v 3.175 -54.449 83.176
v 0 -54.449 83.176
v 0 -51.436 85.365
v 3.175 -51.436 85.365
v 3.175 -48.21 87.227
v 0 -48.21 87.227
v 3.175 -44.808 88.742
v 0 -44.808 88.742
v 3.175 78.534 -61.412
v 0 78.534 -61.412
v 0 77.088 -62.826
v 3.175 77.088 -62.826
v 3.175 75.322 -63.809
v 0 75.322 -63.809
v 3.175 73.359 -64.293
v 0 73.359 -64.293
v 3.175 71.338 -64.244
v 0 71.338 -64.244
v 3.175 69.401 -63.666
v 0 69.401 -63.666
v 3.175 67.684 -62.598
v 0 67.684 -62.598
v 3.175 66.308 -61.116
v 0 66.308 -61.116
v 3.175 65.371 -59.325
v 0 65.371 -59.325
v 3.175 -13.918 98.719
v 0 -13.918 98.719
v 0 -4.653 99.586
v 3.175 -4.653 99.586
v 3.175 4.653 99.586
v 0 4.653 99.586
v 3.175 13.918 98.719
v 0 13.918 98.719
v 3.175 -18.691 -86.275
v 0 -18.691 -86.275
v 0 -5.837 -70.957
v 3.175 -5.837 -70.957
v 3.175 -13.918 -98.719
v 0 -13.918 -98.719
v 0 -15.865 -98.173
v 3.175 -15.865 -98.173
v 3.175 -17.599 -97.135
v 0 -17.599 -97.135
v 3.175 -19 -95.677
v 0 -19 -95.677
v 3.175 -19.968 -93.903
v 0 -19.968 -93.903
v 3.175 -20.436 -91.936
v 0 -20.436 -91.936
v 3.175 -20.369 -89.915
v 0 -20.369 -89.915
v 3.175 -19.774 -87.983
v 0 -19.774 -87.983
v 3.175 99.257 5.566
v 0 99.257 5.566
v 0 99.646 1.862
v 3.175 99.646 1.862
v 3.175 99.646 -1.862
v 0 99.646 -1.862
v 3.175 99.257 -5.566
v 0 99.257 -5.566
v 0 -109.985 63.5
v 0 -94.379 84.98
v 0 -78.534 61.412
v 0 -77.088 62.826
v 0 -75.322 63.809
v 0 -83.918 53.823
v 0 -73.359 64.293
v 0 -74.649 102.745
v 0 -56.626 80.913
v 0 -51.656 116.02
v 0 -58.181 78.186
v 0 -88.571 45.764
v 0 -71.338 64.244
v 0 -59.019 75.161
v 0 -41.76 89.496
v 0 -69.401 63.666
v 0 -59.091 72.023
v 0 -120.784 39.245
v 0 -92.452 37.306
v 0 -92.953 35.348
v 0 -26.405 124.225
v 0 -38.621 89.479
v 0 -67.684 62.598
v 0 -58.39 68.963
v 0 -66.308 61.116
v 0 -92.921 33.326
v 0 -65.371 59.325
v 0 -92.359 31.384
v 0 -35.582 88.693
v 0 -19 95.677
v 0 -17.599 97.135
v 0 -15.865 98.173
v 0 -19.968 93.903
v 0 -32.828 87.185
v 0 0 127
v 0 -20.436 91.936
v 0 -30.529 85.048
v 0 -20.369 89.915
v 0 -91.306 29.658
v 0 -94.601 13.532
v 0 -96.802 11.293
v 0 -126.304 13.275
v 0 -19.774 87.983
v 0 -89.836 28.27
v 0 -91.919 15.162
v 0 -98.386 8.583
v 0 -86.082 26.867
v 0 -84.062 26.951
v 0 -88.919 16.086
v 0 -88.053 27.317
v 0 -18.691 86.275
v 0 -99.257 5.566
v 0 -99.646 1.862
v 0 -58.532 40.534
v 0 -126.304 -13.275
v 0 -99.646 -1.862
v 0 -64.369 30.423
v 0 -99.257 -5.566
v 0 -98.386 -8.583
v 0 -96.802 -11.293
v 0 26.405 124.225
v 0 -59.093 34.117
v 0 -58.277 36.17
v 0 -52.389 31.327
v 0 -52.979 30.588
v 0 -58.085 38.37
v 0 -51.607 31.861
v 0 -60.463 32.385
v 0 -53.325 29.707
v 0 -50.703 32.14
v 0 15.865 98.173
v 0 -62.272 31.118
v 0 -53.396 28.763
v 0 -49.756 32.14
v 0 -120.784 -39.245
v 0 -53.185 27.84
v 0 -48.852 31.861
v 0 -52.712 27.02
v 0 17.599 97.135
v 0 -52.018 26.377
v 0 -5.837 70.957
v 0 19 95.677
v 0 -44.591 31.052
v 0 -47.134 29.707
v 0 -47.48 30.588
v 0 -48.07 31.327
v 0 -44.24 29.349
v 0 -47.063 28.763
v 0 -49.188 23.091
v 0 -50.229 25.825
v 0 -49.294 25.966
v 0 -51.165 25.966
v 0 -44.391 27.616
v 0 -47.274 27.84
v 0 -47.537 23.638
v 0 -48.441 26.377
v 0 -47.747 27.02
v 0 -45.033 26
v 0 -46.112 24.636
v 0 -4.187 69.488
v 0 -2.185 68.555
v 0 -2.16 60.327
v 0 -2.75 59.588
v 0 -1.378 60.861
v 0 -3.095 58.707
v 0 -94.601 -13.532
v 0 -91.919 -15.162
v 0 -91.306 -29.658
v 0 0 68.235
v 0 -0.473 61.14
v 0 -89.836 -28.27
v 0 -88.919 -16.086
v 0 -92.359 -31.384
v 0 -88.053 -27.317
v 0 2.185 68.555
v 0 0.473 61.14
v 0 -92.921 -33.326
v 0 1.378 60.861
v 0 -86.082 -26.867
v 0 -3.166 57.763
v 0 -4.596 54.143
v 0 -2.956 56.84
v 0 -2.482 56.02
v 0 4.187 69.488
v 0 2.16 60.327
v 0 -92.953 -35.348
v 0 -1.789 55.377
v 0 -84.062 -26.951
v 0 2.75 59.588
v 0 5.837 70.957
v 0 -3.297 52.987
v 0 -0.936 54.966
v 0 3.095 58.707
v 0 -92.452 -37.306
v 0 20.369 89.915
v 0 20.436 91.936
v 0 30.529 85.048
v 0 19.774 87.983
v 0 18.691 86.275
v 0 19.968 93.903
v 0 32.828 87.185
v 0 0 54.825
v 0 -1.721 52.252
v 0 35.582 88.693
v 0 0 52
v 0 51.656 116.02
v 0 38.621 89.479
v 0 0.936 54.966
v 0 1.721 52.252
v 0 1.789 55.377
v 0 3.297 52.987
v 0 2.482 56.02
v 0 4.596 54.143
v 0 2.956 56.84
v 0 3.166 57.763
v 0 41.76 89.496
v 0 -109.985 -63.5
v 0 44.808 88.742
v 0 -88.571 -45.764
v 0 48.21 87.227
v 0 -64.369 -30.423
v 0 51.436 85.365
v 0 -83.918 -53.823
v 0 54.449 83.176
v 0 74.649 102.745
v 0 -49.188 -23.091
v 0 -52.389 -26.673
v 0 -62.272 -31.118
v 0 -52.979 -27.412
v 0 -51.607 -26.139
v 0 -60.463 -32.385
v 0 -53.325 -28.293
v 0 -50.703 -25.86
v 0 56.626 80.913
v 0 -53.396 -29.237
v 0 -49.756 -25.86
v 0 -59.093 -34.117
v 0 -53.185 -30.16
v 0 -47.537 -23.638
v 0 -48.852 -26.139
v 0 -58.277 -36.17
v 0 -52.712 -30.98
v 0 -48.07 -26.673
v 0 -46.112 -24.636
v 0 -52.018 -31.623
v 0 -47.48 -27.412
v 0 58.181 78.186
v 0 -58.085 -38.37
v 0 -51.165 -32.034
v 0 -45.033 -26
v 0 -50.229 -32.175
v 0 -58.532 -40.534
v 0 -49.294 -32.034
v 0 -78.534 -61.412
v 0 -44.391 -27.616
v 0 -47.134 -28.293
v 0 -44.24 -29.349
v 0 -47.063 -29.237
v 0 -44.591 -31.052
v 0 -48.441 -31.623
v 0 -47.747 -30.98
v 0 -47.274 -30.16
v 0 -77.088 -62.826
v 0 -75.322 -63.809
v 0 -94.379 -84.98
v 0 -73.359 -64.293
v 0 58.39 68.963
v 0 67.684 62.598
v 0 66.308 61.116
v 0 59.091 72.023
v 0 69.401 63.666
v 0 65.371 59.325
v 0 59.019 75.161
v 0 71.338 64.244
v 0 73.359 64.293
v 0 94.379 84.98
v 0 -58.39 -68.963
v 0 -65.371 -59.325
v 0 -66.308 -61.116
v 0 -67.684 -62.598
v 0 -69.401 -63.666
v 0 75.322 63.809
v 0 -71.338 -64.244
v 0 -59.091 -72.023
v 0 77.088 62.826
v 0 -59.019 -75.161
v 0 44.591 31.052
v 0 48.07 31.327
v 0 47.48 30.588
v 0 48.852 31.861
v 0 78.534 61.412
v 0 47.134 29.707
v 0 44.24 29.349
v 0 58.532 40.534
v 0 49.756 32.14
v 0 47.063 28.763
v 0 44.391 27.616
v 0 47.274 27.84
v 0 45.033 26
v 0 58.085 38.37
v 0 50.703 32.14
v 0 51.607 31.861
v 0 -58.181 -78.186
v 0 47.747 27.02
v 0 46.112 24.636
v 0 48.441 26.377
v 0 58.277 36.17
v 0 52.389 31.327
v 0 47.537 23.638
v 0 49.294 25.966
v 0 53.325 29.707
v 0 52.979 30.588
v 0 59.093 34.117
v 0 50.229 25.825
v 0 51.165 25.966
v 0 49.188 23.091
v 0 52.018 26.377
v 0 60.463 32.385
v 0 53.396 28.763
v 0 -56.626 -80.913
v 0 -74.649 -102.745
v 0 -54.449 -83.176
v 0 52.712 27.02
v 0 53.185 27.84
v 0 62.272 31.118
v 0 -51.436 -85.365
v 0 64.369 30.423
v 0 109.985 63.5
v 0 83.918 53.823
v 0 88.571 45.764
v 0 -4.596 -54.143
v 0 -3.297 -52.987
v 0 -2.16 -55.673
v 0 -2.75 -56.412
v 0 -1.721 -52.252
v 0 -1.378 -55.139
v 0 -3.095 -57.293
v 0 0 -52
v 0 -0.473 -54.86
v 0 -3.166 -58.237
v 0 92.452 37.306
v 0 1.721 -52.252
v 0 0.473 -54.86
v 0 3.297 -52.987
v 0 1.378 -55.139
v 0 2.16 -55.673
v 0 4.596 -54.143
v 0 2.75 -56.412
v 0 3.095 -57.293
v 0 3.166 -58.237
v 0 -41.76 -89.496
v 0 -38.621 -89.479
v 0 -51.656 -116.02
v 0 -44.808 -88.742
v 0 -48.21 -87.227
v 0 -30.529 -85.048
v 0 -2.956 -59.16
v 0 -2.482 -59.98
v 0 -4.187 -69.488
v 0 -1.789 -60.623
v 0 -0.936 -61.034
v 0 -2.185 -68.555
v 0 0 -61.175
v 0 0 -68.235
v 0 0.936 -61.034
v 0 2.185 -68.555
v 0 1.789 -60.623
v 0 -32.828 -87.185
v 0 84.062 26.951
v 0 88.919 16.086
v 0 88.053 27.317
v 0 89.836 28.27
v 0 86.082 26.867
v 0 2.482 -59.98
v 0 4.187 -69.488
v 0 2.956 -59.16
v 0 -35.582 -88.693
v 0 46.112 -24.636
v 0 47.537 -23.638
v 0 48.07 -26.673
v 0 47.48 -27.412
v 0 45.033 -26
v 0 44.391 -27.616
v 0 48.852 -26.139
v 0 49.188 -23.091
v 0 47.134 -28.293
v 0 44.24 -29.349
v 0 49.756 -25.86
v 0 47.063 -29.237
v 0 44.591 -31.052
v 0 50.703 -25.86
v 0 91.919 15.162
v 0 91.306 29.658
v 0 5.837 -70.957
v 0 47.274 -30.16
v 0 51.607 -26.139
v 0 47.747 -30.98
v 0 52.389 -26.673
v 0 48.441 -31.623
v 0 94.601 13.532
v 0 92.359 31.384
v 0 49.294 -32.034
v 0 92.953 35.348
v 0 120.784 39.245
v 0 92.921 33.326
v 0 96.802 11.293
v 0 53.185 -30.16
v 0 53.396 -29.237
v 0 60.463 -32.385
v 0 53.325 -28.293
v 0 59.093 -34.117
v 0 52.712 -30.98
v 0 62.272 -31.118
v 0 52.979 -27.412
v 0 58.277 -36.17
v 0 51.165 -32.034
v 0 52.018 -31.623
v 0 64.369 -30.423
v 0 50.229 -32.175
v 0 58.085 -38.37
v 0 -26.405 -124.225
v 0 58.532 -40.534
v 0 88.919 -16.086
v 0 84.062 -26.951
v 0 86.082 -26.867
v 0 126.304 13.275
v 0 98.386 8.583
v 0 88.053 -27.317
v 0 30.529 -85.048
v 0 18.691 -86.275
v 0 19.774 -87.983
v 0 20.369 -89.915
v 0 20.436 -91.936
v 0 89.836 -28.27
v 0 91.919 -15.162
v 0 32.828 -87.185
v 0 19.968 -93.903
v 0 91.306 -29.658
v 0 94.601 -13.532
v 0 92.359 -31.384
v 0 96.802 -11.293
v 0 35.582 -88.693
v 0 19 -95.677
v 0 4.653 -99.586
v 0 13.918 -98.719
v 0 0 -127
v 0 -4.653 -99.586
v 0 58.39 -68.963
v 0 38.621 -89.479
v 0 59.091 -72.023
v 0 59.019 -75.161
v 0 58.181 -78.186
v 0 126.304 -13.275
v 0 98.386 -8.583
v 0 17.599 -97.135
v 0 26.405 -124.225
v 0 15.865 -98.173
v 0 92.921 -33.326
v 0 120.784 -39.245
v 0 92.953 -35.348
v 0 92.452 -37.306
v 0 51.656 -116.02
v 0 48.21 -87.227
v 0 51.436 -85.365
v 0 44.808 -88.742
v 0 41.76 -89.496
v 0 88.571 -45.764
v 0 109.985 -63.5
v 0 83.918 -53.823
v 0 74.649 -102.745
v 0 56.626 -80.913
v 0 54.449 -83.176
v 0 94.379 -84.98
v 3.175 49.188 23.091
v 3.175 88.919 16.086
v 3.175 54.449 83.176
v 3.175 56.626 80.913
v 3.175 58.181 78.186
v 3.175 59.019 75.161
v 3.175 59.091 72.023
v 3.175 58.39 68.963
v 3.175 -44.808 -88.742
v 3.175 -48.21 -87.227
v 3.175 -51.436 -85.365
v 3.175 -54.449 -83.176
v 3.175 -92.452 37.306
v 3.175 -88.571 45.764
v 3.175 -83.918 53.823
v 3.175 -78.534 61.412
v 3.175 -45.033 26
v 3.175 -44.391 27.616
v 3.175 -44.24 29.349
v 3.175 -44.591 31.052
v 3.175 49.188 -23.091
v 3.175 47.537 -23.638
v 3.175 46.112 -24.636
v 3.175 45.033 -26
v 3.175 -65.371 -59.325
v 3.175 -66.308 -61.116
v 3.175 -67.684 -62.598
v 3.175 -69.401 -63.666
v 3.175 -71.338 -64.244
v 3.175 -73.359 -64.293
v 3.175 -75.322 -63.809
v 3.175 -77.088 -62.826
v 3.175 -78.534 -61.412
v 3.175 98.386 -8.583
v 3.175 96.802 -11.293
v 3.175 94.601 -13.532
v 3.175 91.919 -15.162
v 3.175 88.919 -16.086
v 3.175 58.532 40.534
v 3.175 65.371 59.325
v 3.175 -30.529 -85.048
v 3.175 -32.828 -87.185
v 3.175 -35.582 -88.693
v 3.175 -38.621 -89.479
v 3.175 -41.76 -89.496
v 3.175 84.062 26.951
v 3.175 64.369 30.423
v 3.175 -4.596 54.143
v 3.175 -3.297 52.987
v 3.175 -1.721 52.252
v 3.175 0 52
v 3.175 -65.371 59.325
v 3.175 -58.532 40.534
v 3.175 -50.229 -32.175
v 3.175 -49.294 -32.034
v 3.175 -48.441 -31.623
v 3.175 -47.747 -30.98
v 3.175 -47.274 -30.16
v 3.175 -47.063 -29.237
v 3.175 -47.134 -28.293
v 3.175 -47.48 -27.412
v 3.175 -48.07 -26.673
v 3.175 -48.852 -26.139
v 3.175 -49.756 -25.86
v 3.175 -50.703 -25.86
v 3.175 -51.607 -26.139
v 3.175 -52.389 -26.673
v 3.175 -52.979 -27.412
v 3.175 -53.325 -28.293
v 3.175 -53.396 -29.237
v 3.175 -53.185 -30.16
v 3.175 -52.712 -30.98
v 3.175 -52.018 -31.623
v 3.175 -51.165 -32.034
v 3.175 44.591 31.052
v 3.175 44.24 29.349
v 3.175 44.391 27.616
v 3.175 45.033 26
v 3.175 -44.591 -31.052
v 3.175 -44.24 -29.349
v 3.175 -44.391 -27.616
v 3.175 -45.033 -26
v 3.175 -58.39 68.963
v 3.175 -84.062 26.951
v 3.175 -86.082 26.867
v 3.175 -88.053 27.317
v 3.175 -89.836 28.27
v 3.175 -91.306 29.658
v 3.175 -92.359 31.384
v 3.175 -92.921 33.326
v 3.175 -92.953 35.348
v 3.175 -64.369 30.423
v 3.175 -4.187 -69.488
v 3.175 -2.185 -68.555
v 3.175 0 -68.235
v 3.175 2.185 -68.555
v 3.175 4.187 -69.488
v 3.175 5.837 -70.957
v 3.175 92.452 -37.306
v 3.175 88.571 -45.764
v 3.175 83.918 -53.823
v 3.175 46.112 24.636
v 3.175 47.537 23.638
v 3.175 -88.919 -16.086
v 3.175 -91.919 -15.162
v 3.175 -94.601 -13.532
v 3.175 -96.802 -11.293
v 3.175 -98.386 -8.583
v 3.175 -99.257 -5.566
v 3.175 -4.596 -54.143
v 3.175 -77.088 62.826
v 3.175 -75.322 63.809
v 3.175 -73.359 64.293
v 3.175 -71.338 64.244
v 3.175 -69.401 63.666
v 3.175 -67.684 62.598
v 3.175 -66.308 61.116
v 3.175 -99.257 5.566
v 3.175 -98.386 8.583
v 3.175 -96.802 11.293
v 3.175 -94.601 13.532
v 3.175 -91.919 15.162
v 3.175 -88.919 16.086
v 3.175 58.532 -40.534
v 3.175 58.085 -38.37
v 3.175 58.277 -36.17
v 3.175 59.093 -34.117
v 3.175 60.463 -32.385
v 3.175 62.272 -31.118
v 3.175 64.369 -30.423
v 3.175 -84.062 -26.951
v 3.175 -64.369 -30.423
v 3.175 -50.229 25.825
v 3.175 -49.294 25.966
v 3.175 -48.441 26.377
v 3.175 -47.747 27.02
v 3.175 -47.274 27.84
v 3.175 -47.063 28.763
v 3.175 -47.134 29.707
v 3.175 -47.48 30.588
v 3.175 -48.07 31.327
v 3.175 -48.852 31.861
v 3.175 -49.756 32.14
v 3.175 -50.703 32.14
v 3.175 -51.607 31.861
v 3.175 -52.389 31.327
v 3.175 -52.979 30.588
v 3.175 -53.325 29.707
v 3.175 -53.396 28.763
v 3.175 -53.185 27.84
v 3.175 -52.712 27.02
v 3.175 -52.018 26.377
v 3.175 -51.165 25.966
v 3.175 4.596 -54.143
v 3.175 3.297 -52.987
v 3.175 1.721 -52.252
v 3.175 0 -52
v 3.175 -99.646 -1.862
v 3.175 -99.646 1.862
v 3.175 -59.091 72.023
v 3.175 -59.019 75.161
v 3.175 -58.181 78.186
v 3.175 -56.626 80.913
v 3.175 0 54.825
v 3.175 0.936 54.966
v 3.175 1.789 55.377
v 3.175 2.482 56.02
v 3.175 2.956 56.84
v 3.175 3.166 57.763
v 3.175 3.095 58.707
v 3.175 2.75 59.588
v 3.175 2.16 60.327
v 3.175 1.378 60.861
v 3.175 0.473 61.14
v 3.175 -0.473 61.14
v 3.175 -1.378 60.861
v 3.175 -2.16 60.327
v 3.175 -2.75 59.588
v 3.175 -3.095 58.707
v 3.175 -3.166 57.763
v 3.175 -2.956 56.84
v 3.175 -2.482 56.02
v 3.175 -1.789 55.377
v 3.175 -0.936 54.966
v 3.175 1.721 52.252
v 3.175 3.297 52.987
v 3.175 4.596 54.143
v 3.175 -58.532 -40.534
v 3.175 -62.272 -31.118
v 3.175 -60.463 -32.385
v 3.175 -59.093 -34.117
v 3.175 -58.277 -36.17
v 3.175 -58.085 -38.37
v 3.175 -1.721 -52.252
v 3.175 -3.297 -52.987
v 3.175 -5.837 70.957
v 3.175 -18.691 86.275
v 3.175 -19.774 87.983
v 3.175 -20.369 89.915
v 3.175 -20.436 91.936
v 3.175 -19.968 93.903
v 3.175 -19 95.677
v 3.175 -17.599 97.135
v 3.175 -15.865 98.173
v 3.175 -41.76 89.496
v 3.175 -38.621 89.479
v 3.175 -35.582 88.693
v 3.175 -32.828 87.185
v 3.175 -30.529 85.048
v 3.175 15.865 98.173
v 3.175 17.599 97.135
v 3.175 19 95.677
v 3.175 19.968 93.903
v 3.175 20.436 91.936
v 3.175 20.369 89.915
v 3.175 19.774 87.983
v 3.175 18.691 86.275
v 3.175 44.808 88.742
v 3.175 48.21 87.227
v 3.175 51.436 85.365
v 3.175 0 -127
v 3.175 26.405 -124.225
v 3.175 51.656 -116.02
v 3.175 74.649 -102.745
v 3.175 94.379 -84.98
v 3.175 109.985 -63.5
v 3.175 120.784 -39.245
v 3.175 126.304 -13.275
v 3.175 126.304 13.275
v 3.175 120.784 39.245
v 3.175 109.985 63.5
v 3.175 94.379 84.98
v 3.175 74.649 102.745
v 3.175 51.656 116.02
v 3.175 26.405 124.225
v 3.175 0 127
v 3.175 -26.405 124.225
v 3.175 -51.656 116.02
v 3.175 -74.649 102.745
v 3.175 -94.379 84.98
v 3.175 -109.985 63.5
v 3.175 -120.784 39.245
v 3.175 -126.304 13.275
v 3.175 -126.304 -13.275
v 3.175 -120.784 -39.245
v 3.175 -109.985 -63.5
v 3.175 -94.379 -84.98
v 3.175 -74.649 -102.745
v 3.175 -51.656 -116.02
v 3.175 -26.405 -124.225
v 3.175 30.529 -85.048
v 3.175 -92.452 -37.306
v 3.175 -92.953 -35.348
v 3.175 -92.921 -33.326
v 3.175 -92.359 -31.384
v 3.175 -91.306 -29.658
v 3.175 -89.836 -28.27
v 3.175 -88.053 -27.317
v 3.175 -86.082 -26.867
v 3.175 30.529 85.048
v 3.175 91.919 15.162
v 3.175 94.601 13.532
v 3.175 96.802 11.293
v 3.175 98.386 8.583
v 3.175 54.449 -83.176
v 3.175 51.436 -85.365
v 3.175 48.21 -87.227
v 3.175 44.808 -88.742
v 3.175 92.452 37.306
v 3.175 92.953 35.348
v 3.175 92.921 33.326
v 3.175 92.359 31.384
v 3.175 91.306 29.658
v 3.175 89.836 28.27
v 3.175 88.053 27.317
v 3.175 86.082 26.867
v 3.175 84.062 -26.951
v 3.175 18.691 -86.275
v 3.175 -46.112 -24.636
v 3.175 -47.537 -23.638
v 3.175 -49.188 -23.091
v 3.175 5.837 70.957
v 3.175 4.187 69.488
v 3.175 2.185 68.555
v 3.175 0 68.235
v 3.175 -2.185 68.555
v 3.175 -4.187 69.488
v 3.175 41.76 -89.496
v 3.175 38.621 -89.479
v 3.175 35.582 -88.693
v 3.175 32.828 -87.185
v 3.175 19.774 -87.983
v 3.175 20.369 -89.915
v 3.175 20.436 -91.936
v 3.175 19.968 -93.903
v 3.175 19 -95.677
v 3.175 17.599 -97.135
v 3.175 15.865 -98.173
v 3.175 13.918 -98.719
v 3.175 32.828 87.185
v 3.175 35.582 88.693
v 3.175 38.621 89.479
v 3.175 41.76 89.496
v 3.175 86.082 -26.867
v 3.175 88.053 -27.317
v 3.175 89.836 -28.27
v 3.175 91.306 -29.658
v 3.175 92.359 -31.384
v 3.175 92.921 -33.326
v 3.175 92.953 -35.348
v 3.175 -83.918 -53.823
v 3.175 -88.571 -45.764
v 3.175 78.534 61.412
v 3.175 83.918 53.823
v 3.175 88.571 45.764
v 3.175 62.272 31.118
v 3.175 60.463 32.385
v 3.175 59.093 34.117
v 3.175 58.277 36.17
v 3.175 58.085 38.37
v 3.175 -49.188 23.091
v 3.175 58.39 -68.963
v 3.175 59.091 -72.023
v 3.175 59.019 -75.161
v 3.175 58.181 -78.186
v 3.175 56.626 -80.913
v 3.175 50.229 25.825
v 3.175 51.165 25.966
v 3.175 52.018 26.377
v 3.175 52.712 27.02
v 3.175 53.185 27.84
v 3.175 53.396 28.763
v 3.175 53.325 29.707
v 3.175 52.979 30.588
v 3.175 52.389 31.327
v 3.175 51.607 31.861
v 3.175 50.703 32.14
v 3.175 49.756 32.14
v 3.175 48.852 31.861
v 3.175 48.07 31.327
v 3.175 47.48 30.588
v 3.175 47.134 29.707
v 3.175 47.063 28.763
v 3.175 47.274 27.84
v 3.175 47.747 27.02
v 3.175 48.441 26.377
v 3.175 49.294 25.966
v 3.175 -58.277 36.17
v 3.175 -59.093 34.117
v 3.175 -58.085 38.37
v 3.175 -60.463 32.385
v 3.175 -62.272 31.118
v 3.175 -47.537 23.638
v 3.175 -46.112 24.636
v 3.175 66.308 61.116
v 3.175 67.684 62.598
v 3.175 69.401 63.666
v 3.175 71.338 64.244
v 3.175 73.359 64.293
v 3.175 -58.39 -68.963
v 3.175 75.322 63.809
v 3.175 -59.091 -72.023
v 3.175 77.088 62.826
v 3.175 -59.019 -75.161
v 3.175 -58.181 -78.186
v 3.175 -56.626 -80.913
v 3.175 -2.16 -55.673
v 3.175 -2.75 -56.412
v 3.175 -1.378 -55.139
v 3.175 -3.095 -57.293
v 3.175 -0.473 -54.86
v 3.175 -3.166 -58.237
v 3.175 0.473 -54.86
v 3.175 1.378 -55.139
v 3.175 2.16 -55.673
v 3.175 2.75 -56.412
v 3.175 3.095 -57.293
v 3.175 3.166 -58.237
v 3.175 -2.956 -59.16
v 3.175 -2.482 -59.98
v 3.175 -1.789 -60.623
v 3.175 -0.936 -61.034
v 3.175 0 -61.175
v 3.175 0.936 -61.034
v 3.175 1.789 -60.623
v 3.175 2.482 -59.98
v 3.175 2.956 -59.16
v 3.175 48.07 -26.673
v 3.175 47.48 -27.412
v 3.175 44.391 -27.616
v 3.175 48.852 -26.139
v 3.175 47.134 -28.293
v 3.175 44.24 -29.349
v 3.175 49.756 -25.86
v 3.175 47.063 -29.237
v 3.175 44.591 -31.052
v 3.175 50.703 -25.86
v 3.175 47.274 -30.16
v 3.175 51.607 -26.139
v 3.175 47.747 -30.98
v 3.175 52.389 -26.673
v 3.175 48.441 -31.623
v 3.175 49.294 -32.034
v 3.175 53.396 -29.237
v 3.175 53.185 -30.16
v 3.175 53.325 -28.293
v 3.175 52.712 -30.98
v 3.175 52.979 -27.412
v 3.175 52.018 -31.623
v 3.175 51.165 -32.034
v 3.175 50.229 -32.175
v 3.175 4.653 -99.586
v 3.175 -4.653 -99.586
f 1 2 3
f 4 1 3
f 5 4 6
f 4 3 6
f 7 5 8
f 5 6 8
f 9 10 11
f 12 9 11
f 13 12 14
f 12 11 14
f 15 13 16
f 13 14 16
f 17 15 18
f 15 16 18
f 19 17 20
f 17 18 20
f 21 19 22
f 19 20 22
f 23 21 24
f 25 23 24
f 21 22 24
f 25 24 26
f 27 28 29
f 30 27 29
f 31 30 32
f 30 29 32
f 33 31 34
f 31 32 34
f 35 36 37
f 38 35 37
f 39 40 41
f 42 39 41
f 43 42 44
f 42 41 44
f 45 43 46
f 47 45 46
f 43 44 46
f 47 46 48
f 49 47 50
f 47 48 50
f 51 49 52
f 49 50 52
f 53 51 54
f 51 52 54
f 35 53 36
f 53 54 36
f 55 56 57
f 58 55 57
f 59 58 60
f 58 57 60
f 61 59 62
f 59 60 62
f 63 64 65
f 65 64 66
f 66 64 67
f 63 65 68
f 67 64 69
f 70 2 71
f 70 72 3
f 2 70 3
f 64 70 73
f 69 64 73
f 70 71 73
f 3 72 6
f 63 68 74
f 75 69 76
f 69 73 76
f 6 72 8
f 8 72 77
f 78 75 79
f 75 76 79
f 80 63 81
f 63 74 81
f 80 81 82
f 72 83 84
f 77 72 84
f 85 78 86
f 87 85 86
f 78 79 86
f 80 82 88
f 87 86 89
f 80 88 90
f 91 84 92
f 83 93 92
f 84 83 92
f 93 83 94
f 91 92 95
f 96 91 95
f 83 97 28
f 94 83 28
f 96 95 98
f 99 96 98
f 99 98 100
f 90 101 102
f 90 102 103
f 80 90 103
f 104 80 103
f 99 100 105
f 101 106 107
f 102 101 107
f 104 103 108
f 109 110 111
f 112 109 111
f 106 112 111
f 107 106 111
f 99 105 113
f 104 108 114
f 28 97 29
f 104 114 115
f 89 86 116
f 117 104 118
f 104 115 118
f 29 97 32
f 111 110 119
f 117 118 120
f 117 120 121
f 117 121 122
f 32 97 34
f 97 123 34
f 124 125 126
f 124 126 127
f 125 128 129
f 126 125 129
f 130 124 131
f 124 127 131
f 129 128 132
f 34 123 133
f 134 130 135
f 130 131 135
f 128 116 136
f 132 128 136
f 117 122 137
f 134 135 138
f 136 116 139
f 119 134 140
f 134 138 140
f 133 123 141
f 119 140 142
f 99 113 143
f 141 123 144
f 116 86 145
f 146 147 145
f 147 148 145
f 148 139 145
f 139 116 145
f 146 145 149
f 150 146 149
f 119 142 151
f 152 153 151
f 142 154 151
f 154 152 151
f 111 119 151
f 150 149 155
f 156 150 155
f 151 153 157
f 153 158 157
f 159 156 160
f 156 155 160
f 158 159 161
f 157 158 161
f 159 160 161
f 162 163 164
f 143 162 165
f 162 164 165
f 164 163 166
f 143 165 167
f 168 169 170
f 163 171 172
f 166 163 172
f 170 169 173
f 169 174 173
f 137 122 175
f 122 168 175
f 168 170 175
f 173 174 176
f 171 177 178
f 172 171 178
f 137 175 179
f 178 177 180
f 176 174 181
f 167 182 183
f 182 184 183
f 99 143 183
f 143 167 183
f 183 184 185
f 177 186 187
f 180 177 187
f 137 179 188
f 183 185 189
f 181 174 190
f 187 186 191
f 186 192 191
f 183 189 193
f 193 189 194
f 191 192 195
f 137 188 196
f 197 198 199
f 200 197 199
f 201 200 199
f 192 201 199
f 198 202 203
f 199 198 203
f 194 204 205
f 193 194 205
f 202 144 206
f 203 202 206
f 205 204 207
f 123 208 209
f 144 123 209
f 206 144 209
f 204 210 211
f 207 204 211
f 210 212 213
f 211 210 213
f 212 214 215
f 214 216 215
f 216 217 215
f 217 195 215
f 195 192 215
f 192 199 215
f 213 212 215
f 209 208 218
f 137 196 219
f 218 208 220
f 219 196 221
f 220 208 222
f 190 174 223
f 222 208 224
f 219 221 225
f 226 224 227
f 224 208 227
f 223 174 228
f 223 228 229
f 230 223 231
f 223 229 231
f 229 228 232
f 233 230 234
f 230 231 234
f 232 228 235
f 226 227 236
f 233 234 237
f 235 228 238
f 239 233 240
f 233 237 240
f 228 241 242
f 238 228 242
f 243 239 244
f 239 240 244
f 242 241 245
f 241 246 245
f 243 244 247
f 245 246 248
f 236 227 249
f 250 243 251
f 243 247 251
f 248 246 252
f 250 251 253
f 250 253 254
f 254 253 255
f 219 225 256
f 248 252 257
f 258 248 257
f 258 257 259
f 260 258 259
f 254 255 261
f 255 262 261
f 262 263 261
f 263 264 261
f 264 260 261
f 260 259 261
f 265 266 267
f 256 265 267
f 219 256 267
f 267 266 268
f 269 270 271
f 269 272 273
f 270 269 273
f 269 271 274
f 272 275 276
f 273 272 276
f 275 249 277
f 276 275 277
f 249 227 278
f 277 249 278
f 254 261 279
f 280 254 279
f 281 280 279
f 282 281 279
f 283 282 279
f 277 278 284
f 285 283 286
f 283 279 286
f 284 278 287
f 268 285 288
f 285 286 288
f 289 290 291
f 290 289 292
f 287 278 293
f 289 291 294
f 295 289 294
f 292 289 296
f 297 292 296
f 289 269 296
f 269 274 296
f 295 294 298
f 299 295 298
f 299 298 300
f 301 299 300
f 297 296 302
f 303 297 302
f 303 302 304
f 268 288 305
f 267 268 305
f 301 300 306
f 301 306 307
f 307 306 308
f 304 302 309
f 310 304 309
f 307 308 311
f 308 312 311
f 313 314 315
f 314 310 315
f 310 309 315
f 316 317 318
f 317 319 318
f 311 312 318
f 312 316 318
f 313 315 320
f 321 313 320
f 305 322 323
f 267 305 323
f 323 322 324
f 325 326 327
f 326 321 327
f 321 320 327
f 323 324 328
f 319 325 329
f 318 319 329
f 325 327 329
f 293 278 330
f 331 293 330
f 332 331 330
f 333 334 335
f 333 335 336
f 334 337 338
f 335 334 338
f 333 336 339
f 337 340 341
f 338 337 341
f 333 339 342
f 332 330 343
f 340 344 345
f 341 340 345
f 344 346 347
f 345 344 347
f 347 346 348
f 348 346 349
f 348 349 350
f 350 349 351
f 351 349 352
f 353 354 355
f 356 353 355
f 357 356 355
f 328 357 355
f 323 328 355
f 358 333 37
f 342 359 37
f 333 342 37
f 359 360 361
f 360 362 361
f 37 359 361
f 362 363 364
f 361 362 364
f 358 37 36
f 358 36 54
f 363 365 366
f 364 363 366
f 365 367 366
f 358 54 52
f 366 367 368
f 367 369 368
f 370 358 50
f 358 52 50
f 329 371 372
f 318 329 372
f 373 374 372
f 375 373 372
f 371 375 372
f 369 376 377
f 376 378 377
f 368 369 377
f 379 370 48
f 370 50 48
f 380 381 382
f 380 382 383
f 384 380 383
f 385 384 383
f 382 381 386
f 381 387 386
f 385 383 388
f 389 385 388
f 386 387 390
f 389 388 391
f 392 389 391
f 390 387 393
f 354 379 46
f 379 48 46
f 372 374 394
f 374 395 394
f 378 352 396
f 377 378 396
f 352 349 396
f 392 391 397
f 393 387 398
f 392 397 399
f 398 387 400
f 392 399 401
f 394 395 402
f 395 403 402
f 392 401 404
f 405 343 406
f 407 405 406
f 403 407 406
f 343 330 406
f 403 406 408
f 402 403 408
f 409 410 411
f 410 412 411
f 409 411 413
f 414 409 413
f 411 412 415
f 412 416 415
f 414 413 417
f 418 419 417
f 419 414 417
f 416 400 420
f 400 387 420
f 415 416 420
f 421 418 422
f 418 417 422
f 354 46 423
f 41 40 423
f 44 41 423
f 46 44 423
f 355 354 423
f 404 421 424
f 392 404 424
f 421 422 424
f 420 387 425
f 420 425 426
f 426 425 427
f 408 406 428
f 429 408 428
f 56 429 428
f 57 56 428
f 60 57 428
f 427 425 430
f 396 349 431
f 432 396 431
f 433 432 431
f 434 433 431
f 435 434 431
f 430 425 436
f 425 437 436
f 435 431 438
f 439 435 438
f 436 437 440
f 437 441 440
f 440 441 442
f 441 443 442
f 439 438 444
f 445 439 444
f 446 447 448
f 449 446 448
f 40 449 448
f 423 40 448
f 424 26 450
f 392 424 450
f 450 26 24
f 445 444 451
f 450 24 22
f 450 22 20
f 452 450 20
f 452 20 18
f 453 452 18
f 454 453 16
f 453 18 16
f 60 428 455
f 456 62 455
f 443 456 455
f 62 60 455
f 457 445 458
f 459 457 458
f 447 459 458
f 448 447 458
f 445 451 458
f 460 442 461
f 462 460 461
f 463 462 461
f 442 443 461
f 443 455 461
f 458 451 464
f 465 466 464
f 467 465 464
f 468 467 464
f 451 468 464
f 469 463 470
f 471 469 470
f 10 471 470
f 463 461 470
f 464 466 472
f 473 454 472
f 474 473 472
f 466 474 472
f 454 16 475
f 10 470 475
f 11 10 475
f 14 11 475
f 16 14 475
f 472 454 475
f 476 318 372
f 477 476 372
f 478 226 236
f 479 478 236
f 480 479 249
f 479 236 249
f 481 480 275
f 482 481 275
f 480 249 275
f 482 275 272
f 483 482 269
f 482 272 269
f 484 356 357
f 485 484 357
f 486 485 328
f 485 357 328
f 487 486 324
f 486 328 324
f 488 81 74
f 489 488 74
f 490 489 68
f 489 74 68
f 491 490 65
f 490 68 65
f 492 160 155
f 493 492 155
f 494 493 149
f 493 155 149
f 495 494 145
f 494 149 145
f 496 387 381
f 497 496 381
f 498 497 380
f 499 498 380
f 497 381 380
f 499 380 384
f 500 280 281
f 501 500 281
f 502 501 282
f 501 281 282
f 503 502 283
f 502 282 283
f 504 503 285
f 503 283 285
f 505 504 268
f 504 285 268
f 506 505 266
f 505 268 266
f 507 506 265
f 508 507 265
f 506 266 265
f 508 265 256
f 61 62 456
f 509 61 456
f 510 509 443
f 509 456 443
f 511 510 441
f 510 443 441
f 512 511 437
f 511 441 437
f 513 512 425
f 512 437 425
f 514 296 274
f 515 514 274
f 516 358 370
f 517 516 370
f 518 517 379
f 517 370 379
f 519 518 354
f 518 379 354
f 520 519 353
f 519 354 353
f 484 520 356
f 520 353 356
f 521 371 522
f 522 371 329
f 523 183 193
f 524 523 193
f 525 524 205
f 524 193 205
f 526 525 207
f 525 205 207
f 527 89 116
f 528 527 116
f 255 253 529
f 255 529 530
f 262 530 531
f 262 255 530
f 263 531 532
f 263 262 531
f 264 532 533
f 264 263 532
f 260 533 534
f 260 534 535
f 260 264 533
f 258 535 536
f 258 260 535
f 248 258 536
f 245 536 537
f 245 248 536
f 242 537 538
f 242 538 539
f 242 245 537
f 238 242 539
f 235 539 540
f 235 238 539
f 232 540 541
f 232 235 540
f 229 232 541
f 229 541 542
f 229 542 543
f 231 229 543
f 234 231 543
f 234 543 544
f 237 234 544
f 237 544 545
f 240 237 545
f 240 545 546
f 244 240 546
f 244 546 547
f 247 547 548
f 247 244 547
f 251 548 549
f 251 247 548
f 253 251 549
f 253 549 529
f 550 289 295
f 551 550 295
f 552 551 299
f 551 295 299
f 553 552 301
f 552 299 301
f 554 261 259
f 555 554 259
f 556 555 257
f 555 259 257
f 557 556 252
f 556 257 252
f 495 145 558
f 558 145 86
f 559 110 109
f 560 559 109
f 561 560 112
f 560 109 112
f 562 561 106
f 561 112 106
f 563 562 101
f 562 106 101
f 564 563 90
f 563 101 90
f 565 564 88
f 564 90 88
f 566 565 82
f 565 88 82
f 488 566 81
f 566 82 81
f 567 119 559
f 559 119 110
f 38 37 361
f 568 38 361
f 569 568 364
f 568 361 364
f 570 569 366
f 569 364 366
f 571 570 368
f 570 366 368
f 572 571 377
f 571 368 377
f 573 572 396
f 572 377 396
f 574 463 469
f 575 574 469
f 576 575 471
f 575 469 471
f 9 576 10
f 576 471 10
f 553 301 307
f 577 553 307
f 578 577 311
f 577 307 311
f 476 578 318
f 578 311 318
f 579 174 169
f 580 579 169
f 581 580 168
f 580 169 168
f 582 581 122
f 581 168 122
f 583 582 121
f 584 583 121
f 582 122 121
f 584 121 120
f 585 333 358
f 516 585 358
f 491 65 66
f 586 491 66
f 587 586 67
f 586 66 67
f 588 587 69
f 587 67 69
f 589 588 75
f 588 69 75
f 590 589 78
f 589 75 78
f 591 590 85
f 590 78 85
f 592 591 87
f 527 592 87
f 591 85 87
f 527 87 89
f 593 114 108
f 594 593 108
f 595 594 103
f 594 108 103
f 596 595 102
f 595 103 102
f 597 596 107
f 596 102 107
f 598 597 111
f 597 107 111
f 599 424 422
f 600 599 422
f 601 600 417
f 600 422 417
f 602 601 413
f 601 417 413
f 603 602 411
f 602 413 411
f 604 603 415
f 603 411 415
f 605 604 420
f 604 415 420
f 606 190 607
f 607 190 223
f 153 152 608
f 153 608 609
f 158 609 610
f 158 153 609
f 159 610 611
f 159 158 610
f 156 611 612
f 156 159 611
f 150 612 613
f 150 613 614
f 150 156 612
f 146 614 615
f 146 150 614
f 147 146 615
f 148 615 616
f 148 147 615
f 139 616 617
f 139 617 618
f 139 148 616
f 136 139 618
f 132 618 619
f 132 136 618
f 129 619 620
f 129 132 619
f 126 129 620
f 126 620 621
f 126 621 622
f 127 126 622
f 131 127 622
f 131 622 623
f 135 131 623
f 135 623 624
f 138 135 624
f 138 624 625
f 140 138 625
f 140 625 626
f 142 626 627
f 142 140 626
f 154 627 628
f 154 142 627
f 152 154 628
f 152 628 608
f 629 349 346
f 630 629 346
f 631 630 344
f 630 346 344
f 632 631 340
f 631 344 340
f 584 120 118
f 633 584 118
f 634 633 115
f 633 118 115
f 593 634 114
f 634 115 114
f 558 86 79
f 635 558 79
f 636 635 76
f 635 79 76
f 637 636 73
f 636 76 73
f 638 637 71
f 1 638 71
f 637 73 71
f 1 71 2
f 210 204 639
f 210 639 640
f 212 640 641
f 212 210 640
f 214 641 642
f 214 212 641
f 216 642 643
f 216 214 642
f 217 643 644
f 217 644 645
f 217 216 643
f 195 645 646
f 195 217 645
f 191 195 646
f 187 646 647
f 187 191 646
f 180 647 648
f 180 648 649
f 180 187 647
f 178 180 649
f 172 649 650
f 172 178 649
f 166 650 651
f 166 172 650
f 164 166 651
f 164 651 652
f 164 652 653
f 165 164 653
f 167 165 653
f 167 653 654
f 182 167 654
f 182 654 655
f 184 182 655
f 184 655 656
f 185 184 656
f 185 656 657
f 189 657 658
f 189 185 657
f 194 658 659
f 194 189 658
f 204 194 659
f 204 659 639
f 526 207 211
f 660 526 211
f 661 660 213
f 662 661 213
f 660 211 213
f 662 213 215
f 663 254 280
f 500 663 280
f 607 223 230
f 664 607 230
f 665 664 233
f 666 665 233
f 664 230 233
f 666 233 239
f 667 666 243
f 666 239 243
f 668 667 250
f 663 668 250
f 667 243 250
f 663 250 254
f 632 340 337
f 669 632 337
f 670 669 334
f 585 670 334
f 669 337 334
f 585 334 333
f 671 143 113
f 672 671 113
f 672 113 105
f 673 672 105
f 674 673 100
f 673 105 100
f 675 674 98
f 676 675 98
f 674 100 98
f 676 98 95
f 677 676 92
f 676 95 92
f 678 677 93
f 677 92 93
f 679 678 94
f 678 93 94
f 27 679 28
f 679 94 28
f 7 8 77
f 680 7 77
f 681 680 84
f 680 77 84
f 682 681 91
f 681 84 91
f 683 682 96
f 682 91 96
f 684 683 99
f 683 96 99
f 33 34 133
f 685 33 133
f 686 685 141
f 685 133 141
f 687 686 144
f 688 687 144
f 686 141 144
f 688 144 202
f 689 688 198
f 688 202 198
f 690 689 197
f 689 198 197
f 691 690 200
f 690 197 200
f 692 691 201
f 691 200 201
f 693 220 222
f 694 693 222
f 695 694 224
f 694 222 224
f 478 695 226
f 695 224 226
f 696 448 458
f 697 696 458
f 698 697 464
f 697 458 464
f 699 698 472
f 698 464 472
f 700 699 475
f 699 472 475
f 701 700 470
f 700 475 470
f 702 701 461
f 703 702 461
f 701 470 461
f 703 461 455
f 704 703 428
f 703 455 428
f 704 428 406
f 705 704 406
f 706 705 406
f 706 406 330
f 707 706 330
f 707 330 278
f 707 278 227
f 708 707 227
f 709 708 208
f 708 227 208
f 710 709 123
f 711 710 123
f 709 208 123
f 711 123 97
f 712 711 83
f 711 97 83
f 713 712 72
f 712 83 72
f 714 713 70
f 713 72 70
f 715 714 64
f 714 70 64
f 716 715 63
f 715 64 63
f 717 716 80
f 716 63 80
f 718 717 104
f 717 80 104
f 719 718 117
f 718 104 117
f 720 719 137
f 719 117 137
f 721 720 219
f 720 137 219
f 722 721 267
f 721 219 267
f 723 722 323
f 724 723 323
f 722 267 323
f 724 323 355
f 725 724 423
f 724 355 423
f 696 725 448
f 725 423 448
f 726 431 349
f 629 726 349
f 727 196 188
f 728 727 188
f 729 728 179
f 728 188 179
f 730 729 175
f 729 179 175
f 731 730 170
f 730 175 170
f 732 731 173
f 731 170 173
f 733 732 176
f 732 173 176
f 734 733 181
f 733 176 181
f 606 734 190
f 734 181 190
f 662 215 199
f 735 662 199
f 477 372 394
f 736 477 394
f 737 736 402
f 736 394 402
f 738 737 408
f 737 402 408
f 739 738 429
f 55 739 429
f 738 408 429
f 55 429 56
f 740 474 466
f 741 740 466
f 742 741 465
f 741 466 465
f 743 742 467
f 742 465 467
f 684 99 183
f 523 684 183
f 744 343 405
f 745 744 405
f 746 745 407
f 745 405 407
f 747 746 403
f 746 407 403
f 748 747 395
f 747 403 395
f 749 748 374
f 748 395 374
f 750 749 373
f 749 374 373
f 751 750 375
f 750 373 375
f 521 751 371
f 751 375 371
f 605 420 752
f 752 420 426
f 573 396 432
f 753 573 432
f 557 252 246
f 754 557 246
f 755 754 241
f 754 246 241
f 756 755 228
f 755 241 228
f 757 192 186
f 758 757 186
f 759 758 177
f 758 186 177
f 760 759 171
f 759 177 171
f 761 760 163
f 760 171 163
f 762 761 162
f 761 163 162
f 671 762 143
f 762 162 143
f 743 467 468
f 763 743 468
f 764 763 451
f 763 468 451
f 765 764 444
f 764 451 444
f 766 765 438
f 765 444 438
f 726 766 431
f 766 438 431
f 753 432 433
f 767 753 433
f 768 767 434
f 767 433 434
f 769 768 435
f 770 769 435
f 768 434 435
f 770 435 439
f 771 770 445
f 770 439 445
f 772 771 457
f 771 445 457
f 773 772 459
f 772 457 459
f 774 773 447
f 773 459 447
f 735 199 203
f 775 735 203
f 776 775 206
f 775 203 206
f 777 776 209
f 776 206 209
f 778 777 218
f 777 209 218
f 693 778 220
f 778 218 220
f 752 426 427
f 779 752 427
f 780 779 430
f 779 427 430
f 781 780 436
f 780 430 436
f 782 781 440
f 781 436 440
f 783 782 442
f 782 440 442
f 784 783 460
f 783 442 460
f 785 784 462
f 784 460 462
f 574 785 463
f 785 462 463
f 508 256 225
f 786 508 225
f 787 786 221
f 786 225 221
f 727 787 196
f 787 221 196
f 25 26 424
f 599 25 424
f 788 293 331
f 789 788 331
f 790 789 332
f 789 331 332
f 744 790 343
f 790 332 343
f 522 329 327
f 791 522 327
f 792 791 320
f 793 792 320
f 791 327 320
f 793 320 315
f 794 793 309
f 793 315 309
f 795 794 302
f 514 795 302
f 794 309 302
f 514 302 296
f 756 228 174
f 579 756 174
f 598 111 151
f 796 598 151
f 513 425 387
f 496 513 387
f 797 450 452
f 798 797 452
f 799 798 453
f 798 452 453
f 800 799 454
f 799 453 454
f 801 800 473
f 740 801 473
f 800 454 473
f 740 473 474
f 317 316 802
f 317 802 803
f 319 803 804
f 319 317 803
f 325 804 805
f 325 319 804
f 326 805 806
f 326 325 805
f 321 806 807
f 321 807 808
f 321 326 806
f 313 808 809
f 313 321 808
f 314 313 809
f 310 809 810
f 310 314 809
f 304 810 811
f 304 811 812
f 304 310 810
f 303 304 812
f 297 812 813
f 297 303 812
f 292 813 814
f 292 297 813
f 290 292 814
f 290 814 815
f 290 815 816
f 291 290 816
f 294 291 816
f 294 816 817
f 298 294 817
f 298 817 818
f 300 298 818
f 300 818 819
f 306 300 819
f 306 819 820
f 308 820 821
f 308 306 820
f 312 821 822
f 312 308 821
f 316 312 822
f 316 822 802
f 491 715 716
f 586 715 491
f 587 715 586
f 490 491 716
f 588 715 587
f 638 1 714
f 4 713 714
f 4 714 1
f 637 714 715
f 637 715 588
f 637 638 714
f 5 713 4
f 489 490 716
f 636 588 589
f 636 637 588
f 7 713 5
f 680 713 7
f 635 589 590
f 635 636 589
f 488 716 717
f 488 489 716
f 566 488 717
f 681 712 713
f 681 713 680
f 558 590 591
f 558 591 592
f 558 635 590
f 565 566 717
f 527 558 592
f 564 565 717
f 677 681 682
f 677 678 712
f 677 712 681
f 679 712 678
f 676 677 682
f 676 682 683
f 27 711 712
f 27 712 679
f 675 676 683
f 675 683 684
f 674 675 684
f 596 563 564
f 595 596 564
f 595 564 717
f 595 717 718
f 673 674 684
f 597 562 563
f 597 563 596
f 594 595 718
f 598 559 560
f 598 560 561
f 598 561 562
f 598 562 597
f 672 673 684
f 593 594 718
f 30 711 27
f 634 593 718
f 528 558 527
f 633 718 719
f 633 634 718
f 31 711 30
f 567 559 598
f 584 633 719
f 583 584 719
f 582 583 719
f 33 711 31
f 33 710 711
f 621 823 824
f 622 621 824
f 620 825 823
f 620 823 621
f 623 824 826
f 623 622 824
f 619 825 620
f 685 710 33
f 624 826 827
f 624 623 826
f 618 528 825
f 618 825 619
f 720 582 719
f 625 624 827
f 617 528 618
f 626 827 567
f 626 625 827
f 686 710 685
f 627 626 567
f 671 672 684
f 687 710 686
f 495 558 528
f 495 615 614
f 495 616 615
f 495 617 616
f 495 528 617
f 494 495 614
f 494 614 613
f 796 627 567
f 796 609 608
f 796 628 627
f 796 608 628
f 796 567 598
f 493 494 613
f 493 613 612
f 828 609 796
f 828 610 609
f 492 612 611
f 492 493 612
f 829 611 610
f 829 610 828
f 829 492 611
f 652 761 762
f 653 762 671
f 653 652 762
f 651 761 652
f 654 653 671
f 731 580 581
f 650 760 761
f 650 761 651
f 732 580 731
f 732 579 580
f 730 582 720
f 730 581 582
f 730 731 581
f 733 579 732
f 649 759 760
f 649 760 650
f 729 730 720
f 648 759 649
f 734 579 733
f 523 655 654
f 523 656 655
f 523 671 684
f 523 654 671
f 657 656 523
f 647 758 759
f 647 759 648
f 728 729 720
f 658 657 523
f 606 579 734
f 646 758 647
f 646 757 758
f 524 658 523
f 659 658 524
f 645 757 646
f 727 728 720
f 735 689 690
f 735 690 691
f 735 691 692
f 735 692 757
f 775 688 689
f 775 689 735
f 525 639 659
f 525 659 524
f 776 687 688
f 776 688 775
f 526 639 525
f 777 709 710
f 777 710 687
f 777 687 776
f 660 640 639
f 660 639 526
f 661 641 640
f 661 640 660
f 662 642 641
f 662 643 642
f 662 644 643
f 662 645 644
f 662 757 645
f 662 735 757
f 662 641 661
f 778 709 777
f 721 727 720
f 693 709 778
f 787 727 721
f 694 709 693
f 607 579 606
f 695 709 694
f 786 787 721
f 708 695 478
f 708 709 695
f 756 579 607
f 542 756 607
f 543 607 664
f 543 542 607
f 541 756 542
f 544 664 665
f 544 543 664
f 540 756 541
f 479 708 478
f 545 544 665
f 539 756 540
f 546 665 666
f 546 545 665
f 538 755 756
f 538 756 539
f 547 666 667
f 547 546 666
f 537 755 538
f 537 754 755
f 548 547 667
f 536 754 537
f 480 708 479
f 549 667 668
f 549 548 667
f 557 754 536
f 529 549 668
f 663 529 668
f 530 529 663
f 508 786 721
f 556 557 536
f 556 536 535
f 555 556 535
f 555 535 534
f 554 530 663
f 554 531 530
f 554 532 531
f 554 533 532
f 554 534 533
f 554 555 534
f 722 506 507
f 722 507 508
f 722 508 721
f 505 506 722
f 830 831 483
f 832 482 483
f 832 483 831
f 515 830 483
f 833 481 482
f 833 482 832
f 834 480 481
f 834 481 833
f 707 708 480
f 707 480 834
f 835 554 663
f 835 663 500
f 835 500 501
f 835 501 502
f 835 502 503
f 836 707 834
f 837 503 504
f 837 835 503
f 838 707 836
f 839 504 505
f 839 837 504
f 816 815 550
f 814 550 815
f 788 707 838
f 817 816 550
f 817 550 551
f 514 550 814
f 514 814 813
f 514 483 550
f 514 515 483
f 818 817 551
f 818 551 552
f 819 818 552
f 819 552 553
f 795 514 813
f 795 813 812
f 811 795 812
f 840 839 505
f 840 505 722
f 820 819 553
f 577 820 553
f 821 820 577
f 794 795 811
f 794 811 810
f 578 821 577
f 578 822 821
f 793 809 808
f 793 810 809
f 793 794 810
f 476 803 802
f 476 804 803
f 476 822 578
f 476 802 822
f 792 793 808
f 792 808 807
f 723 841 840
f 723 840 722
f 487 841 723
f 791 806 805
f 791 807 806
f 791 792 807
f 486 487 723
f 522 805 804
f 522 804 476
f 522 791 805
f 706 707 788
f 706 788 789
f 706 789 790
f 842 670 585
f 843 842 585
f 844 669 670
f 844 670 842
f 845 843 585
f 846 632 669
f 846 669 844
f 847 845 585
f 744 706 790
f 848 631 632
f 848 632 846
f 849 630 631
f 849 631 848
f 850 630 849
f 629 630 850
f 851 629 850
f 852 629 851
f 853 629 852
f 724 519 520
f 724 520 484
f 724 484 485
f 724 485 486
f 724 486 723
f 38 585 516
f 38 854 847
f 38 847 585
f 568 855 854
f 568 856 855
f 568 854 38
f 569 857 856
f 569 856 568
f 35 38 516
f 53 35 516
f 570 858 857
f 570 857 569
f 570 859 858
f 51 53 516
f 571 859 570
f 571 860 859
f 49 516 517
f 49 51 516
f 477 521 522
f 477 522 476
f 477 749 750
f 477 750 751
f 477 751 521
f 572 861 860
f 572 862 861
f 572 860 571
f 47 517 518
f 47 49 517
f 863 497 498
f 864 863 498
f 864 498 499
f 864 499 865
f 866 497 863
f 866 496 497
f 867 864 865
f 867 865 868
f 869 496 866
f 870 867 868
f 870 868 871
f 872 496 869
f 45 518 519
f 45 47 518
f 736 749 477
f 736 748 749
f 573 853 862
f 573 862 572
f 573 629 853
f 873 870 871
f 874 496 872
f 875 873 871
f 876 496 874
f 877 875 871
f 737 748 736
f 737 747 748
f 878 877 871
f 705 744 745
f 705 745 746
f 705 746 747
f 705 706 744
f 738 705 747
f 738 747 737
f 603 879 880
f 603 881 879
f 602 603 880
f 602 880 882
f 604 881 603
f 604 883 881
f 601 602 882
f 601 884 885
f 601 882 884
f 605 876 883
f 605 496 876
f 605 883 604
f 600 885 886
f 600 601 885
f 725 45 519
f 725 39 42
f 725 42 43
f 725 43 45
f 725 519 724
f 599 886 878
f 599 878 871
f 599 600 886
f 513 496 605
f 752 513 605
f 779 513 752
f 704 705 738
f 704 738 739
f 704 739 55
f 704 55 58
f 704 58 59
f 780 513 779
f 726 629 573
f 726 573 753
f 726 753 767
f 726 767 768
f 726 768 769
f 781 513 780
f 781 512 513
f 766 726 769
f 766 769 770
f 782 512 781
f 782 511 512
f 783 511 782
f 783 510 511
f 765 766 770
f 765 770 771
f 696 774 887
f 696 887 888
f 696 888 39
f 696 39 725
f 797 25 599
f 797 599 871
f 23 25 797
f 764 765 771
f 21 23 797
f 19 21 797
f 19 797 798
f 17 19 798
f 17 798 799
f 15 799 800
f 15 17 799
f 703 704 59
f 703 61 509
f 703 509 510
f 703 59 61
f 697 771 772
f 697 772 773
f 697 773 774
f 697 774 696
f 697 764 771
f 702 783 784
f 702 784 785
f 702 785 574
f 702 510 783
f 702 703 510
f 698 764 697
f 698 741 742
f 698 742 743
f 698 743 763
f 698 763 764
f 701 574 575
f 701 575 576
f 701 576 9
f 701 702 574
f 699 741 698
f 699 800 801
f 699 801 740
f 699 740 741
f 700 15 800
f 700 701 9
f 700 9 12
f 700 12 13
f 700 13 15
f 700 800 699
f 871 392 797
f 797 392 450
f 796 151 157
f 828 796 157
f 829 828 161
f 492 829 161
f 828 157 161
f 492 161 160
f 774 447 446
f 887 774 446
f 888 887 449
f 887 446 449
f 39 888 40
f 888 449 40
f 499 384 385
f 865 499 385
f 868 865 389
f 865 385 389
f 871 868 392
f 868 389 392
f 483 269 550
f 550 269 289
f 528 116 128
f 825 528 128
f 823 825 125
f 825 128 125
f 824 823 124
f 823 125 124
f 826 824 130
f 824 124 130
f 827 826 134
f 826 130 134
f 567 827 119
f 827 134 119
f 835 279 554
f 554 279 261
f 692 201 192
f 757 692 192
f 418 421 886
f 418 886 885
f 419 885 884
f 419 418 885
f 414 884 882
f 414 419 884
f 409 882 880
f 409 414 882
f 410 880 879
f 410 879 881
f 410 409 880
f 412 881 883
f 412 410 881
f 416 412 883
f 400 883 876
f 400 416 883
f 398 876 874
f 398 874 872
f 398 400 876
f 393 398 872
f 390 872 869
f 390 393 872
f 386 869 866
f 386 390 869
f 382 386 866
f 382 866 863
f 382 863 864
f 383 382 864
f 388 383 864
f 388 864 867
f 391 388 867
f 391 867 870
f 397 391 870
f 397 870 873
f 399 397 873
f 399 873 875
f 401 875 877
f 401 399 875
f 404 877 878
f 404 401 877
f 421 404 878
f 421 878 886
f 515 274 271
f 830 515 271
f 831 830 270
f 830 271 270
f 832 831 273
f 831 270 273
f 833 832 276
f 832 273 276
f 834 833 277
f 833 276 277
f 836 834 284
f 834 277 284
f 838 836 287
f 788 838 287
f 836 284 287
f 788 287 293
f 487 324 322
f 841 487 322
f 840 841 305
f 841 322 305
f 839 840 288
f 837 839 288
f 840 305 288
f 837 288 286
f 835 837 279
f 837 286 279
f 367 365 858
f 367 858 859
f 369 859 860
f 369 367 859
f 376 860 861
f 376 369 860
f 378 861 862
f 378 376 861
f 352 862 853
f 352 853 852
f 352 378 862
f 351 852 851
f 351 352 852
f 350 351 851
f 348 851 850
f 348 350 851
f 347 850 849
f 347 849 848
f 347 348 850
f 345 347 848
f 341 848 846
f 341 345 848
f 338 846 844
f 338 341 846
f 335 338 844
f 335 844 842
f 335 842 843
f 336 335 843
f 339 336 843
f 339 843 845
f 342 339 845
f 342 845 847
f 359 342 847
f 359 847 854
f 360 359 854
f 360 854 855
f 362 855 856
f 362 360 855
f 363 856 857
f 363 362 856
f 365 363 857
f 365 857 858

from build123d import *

# Parameters (mm, degrees)
SKETCH1_R           = 127
SKETCH1_R_2         = 3.175
BOSS_EXTRUDE1_DEPTH = 3.175


with BuildPart() as part:
    # Sketch1 → Boss-Extrude1 (new body)
    with BuildSketch(Plane(origin=(0, 0, 0), x_dir=(0, 0, -1), z_dir=(1, 0, 0))):
        Circle(SKETCH1_R)
        with BuildLine():
            ThreePointArc((-40.533501272, -58.531566299), (-34.11730778, -59.092910493), (-30.423072702, -64.368824956))
            Line((-30.423072702, -64.368824956), (-26.950595308, -84.062222874))
            ThreePointArc((-26.950595308, -84.062222874), (-29.658123464, -91.306232972), (-37.306264624, -92.451801739))
            ThreePointArc((-37.306264624, -92.451801739), (-49.8475, -86.33840263), (-61.412476619, -78.534073754))
            ThreePointArc((-61.412476619, -78.534073754), (-64.244455546, -71.337804834), (-59.324722854, -65.371011621))
            Line((-59.324722854, -65.371011621), (-40.533501272, -58.531566299))
        make_face(mode=Mode.SUBTRACT)
        with BuildLine():
            ThreePointArc((-70.956573975, 5.837258657), (-68.234615561, 0), (-70.956573975, -5.837258657))
            Line((-70.956573975, -5.837258657), (-86.275318162, -18.691211254))
            ThreePointArc((-86.275318162, -18.691211254), (-93.90257901, -19.968428138), (-98.718741244, -13.917727985))
            ThreePointArc((-98.718741244, -13.917727985), (-99.695, 0), (-98.718741244, 13.917727985))
            ThreePointArc((-98.718741244, 13.917727985), (-93.90257901, 19.968428138), (-86.275318162, 18.691211254))
            Line((-86.275318162, 18.691211254), (-70.956573975, 5.837258657))
        make_face(mode=Mode.SUBTRACT)
        with Locations((-29, -50.229473419)):
            Circle(SKETCH1_R_2, mode=Mode.SUBTRACT)
        with BuildLine():
            ThreePointArc((30.423072702, -64.368824956), (34.11730778, -59.092910493), (40.533501272, -58.531566299))
            Line((40.533501272, -58.531566299), (59.324722854, -65.371011621))
            ThreePointArc((59.324722854, -65.371011621), (64.244455546, -71.337804834), (61.412476619, -78.534073754))
            ThreePointArc((61.412476619, -78.534073754), (49.8475, -86.33840263), (37.306264624, -92.451801739))
            ThreePointArc((37.306264624, -92.451801739), (29.658123464, -91.306232972), (26.950595308, -84.062222874))
            Line((26.950595308, -84.062222874), (30.423072702, -64.368824956))
        make_face(mode=Mode.SUBTRACT)
        with Locations((29, -50.229473419)):
            Circle(SKETCH1_R_2, mode=Mode.SUBTRACT)
        with BuildLine():
            Line((16.085518962, 88.918512041), (23.091153482, 49.187584353))
            ThreePointArc((23.091153482, 49.187584353), (24.085087734, 46.788014801), (26, 45.033320997))
            ThreePointArc((26, 45.033320997), (28.477065544, 44.252305231), (31.05212086, 44.591317695))
            Line((31.05212086, 44.591317695), (68.962930813, 58.389724075))
            ThreePointArc((68.962930813, 58.389724075), (76.699872074, 58.693912553), (83.175501835, 54.449032119))
            ThreePointArc((83.175501835, 54.449032119), (86.33840263, 49.8475), (88.741995944, 44.807581502))
            ThreePointArc((88.741995944, 44.807581502), (89.180355355, 37.077081406), (85.048449775, 30.528787966))
            Line((85.048449775, 30.528787966), (54.143274342, 4.596266659))
            ThreePointArc((54.143274342, 4.596266659), (52.562153278, 2.53570957), (52, 0))
            ThreePointArc((52, 0), (52.562153278, -2.53570957), (54.143274342, -4.596266659))
            Line((54.143274342, -4.596266659), (85.048449775, -30.528787966))
            ThreePointArc((85.048449775, -30.528787966), (89.180355355, -37.077081406), (88.741995944, -44.807581502))
            ThreePointArc((88.741995944, -44.807581502), (86.33840263, -49.8475), (83.175501835, -54.449032119))
            ThreePointArc((83.175501835, -54.449032119), (76.699872074, -58.693912553), (68.962930813, -58.389724075))
            Line((68.962930813, -58.389724075), (31.05212086, -44.591317695))
            ThreePointArc((31.05212086, -44.591317695), (28.477065544, -44.252305231), (26, -45.033320997))
            ThreePointArc((26, -45.033320997), (24.085087734, -46.788014801), (23.091153482, -49.187584353))
            Line((23.091153482, -49.187584353), (16.085518962, -88.918512041))
            ThreePointArc((16.085518962, -88.918512041), (12.480483281, -95.770993959), (5.566494109, -99.256613621))
            ThreePointArc((5.566494109, -99.256613621), (0, -99.695), (-5.566494109, -99.256613621))
            ThreePointArc((-5.566494109, -99.256613621), (-12.480483281, -95.770993959), (-16.085518962, -88.918512041))
            Line((-16.085518962, -88.918512041), (-23.091153482, -49.187584353))
            ThreePointArc((-23.091153482, -49.187584353), (-24.085087734, -46.788014801), (-26, -45.033320997))
            ThreePointArc((-26, -45.033320997), (-28.477065544, -44.252305231), (-31.05212086, -44.591317695))
            Line((-31.05212086, -44.591317695), (-68.962930813, -58.389724075))
            ThreePointArc((-68.962930813, -58.389724075), (-76.699872074, -58.693912553), (-83.175501835, -54.449032119))
            ThreePointArc((-83.175501835, -54.449032119), (-86.33840263, -49.8475), (-88.741995944, -44.807581502))
            ThreePointArc((-88.741995944, -44.807581502), (-89.180355355, -37.077081406), (-85.048449775, -30.528787966))
            Line((-85.048449775, -30.528787966), (-54.143274342, -4.596266659))
            ThreePointArc((-54.143274342, -4.596266659), (-52.562153278, -2.53570957), (-52, 0))
            ThreePointArc((-52, 0), (-52.562153278, 2.53570957), (-54.143274342, 4.596266659))
            Line((-54.143274342, 4.596266659), (-85.048449775, 30.528787966))
            ThreePointArc((-85.048449775, 30.528787966), (-89.180355355, 37.077081406), (-88.741995944, 44.807581502))
            ThreePointArc((-88.741995944, 44.807581502), (-86.33840263, 49.8475), (-83.175501835, 54.449032119))
            ThreePointArc((-83.175501835, 54.449032119), (-76.699872074, 58.693912553), (-68.962930813, 58.389724075))
            Line((-68.962930813, 58.389724075), (-31.05212086, 44.591317695))
            ThreePointArc((-31.05212086, 44.591317695), (-28.477065544, 44.252305231), (-26, 45.033320997))
            ThreePointArc((-26, 45.033320997), (-24.085087734, 46.788014801), (-23.091153482, 49.187584353))
            Line((-23.091153482, 49.187584353), (-16.085518962, 88.918512041))
            ThreePointArc((-16.085518962, 88.918512041), (-12.480483281, 95.770993959), (-5.566494109, 99.256613621))
            ThreePointArc((-5.566494109, 99.256613621), (0, 99.695), (5.566494109, 99.256613621))
            ThreePointArc((5.566494109, 99.256613621), (12.480483281, 95.770993959), (16.085518962, 88.918512041))
        make_face(mode=Mode.SUBTRACT)
        with Locations((-58, 0)):
            Circle(SKETCH1_R_2, mode=Mode.SUBTRACT)
        with Locations((-29, 50.229473419)):
            Circle(SKETCH1_R_2, mode=Mode.SUBTRACT)
        with BuildLine():
            ThreePointArc((-30.423072702, 64.368824956), (-34.11730778, 59.092910493), (-40.533501272, 58.531566299))
            Line((-40.533501272, 58.531566299), (-59.324722854, 65.371011621))
            ThreePointArc((-59.324722854, 65.371011621), (-64.244455546, 71.337804834), (-61.412476619, 78.534073754))
            ThreePointArc((-61.412476619, 78.534073754), (-49.8475, 86.33840263), (-37.306264624, 92.451801739))
            ThreePointArc((-37.306264624, 92.451801739), (-29.658123464, 91.306232972), (-26.950595308, 84.062222874))
            Line((-26.950595308, 84.062222874), (-30.423072702, 64.368824956))
        make_face(mode=Mode.SUBTRACT)
        with Locations((58, 0)):
            Circle(SKETCH1_R_2, mode=Mode.SUBTRACT)
        with Locations((29, 50.229473419)):
            Circle(SKETCH1_R_2, mode=Mode.SUBTRACT)
        with BuildLine():
            ThreePointArc((70.956573975, -5.837258657), (68.234615561, 0), (70.956573975, 5.837258657))
            Line((70.956573975, 5.837258657), (86.275318162, 18.691211254))
            ThreePointArc((86.275318162, 18.691211254), (93.90257901, 19.968428138), (98.718741244, 13.917727985))
            ThreePointArc((98.718741244, 13.917727985), (99.695, 0), (98.718741244, -13.917727985))
            ThreePointArc((98.718741244, -13.917727985), (93.90257901, -19.968428138), (86.275318162, -18.691211254))
            Line((86.275318162, -18.691211254), (70.956573975, -5.837258657))
        make_face(mode=Mode.SUBTRACT)
        with BuildLine():
            ThreePointArc((40.533501272, 58.531566299), (34.11730778, 59.092910493), (30.423072702, 64.368824956))
            Line((30.423072702, 64.368824956), (26.950595308, 84.062222874))
            ThreePointArc((26.950595308, 84.062222874), (29.658123464, 91.306232972), (37.306264624, 92.451801739))
            ThreePointArc((37.306264624, 92.451801739), (49.8475, 86.33840263), (61.412476619, 78.534073754))
            ThreePointArc((61.412476619, 78.534073754), (64.244455546, 71.337804834), (59.324722854, 65.371011621))
            Line((59.324722854, 65.371011621), (40.533501272, 58.531566299))
        make_face(mode=Mode.SUBTRACT)
    extrude(amount=BOSS_EXTRUDE1_DEPTH)


solid = part.part
